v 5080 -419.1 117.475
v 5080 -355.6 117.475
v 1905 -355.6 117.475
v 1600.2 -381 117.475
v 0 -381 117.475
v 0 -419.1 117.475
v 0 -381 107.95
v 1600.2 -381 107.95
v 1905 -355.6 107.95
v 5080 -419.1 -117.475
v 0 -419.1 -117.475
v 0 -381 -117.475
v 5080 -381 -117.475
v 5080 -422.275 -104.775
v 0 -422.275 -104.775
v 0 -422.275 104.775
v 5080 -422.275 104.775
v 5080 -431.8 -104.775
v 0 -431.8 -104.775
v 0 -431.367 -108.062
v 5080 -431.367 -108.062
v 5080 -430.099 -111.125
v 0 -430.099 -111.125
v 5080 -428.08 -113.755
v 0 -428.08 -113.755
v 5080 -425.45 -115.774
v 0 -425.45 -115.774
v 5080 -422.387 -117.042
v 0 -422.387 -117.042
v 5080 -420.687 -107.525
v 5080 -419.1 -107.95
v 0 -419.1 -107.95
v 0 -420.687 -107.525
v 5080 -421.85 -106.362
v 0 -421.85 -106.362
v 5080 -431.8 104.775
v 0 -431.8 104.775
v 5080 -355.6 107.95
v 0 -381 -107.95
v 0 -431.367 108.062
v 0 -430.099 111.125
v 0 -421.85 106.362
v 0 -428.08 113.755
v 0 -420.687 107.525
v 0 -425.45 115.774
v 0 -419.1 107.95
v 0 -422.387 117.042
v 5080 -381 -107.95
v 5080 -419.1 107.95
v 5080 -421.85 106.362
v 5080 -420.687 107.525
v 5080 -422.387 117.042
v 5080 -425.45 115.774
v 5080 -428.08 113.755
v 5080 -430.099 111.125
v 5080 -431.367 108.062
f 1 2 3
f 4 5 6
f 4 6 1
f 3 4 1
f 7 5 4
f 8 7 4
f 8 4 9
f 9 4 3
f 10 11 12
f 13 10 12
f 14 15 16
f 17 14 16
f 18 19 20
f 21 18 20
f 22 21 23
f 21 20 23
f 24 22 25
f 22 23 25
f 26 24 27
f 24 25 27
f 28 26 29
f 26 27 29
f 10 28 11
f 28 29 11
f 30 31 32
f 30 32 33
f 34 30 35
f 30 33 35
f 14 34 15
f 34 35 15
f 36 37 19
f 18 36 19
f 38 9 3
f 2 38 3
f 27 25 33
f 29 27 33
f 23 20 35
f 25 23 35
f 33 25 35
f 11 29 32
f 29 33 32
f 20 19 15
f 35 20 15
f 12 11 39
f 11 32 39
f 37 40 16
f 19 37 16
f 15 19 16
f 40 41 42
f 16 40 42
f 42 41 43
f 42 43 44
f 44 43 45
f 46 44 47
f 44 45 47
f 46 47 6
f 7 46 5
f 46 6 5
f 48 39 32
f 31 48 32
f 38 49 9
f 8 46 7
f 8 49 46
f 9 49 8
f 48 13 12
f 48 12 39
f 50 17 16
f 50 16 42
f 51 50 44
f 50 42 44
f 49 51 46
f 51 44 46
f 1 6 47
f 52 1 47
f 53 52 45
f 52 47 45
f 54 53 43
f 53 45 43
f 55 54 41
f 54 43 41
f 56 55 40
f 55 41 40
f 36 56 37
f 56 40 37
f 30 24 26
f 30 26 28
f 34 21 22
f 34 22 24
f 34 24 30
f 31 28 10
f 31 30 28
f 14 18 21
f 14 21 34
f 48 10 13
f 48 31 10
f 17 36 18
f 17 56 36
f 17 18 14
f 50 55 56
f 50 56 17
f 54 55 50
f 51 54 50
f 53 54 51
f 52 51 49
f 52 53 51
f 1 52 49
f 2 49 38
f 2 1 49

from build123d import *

# Parameters (mm, degrees)
F1_DEPTH = 5080
F3_DEPTH = 234.951


with BuildPart() as f1:
    # F0 (on Right) → F1 (new body)
    with BuildSketch(Plane.YZ):
        with BuildLine():
            Line((-431.8, 104.775), (-431.8, 0))
            Line((-431.8, 0), (-431.8, -104.775))
            ThreePointArc((-431.8, -104.775), (-428.080256, -113.755256), (-419.1, -117.475))
            Line((-419.1, -117.475), (-381, -117.475))
            Line((-381, -117.475), (-381, -107.95))
            Line((-381, -107.95), (-419.1, -107.95))
            ThreePointArc((-419.1, -107.95), (-421.345064, -107.020064), (-422.275, -104.775))
            Line((-422.275, -104.775), (-422.275, 0))
            Line((-422.275, 0), (-422.275, 104.775))
            ThreePointArc((-422.275, 104.775), (-421.345064, 107.020064), (-419.1, 107.95))
            Line((-419.1, 107.95), (-355.6, 107.95))
            Line((-355.6, 107.95), (-355.6, 117.475))
            Line((-355.6, 117.475), (-419.1, 117.475))
            ThreePointArc((-419.1, 117.475), (-428.080256, 113.755256), (-431.8, 104.775))
        make_face()
    extrude(amount=F1_DEPTH)

    # F2 (on face) → F3 (cut, through all)
    with BuildSketch(Plane.XY.offset(117.475)):
        Polygon((1600.2, -381), (1905, -355.6), (0, -355.6), (0, -381), align=None)
    extrude(amount=-F3_DEPTH, mode=Mode.SUBTRACT)


solid = f1.part
